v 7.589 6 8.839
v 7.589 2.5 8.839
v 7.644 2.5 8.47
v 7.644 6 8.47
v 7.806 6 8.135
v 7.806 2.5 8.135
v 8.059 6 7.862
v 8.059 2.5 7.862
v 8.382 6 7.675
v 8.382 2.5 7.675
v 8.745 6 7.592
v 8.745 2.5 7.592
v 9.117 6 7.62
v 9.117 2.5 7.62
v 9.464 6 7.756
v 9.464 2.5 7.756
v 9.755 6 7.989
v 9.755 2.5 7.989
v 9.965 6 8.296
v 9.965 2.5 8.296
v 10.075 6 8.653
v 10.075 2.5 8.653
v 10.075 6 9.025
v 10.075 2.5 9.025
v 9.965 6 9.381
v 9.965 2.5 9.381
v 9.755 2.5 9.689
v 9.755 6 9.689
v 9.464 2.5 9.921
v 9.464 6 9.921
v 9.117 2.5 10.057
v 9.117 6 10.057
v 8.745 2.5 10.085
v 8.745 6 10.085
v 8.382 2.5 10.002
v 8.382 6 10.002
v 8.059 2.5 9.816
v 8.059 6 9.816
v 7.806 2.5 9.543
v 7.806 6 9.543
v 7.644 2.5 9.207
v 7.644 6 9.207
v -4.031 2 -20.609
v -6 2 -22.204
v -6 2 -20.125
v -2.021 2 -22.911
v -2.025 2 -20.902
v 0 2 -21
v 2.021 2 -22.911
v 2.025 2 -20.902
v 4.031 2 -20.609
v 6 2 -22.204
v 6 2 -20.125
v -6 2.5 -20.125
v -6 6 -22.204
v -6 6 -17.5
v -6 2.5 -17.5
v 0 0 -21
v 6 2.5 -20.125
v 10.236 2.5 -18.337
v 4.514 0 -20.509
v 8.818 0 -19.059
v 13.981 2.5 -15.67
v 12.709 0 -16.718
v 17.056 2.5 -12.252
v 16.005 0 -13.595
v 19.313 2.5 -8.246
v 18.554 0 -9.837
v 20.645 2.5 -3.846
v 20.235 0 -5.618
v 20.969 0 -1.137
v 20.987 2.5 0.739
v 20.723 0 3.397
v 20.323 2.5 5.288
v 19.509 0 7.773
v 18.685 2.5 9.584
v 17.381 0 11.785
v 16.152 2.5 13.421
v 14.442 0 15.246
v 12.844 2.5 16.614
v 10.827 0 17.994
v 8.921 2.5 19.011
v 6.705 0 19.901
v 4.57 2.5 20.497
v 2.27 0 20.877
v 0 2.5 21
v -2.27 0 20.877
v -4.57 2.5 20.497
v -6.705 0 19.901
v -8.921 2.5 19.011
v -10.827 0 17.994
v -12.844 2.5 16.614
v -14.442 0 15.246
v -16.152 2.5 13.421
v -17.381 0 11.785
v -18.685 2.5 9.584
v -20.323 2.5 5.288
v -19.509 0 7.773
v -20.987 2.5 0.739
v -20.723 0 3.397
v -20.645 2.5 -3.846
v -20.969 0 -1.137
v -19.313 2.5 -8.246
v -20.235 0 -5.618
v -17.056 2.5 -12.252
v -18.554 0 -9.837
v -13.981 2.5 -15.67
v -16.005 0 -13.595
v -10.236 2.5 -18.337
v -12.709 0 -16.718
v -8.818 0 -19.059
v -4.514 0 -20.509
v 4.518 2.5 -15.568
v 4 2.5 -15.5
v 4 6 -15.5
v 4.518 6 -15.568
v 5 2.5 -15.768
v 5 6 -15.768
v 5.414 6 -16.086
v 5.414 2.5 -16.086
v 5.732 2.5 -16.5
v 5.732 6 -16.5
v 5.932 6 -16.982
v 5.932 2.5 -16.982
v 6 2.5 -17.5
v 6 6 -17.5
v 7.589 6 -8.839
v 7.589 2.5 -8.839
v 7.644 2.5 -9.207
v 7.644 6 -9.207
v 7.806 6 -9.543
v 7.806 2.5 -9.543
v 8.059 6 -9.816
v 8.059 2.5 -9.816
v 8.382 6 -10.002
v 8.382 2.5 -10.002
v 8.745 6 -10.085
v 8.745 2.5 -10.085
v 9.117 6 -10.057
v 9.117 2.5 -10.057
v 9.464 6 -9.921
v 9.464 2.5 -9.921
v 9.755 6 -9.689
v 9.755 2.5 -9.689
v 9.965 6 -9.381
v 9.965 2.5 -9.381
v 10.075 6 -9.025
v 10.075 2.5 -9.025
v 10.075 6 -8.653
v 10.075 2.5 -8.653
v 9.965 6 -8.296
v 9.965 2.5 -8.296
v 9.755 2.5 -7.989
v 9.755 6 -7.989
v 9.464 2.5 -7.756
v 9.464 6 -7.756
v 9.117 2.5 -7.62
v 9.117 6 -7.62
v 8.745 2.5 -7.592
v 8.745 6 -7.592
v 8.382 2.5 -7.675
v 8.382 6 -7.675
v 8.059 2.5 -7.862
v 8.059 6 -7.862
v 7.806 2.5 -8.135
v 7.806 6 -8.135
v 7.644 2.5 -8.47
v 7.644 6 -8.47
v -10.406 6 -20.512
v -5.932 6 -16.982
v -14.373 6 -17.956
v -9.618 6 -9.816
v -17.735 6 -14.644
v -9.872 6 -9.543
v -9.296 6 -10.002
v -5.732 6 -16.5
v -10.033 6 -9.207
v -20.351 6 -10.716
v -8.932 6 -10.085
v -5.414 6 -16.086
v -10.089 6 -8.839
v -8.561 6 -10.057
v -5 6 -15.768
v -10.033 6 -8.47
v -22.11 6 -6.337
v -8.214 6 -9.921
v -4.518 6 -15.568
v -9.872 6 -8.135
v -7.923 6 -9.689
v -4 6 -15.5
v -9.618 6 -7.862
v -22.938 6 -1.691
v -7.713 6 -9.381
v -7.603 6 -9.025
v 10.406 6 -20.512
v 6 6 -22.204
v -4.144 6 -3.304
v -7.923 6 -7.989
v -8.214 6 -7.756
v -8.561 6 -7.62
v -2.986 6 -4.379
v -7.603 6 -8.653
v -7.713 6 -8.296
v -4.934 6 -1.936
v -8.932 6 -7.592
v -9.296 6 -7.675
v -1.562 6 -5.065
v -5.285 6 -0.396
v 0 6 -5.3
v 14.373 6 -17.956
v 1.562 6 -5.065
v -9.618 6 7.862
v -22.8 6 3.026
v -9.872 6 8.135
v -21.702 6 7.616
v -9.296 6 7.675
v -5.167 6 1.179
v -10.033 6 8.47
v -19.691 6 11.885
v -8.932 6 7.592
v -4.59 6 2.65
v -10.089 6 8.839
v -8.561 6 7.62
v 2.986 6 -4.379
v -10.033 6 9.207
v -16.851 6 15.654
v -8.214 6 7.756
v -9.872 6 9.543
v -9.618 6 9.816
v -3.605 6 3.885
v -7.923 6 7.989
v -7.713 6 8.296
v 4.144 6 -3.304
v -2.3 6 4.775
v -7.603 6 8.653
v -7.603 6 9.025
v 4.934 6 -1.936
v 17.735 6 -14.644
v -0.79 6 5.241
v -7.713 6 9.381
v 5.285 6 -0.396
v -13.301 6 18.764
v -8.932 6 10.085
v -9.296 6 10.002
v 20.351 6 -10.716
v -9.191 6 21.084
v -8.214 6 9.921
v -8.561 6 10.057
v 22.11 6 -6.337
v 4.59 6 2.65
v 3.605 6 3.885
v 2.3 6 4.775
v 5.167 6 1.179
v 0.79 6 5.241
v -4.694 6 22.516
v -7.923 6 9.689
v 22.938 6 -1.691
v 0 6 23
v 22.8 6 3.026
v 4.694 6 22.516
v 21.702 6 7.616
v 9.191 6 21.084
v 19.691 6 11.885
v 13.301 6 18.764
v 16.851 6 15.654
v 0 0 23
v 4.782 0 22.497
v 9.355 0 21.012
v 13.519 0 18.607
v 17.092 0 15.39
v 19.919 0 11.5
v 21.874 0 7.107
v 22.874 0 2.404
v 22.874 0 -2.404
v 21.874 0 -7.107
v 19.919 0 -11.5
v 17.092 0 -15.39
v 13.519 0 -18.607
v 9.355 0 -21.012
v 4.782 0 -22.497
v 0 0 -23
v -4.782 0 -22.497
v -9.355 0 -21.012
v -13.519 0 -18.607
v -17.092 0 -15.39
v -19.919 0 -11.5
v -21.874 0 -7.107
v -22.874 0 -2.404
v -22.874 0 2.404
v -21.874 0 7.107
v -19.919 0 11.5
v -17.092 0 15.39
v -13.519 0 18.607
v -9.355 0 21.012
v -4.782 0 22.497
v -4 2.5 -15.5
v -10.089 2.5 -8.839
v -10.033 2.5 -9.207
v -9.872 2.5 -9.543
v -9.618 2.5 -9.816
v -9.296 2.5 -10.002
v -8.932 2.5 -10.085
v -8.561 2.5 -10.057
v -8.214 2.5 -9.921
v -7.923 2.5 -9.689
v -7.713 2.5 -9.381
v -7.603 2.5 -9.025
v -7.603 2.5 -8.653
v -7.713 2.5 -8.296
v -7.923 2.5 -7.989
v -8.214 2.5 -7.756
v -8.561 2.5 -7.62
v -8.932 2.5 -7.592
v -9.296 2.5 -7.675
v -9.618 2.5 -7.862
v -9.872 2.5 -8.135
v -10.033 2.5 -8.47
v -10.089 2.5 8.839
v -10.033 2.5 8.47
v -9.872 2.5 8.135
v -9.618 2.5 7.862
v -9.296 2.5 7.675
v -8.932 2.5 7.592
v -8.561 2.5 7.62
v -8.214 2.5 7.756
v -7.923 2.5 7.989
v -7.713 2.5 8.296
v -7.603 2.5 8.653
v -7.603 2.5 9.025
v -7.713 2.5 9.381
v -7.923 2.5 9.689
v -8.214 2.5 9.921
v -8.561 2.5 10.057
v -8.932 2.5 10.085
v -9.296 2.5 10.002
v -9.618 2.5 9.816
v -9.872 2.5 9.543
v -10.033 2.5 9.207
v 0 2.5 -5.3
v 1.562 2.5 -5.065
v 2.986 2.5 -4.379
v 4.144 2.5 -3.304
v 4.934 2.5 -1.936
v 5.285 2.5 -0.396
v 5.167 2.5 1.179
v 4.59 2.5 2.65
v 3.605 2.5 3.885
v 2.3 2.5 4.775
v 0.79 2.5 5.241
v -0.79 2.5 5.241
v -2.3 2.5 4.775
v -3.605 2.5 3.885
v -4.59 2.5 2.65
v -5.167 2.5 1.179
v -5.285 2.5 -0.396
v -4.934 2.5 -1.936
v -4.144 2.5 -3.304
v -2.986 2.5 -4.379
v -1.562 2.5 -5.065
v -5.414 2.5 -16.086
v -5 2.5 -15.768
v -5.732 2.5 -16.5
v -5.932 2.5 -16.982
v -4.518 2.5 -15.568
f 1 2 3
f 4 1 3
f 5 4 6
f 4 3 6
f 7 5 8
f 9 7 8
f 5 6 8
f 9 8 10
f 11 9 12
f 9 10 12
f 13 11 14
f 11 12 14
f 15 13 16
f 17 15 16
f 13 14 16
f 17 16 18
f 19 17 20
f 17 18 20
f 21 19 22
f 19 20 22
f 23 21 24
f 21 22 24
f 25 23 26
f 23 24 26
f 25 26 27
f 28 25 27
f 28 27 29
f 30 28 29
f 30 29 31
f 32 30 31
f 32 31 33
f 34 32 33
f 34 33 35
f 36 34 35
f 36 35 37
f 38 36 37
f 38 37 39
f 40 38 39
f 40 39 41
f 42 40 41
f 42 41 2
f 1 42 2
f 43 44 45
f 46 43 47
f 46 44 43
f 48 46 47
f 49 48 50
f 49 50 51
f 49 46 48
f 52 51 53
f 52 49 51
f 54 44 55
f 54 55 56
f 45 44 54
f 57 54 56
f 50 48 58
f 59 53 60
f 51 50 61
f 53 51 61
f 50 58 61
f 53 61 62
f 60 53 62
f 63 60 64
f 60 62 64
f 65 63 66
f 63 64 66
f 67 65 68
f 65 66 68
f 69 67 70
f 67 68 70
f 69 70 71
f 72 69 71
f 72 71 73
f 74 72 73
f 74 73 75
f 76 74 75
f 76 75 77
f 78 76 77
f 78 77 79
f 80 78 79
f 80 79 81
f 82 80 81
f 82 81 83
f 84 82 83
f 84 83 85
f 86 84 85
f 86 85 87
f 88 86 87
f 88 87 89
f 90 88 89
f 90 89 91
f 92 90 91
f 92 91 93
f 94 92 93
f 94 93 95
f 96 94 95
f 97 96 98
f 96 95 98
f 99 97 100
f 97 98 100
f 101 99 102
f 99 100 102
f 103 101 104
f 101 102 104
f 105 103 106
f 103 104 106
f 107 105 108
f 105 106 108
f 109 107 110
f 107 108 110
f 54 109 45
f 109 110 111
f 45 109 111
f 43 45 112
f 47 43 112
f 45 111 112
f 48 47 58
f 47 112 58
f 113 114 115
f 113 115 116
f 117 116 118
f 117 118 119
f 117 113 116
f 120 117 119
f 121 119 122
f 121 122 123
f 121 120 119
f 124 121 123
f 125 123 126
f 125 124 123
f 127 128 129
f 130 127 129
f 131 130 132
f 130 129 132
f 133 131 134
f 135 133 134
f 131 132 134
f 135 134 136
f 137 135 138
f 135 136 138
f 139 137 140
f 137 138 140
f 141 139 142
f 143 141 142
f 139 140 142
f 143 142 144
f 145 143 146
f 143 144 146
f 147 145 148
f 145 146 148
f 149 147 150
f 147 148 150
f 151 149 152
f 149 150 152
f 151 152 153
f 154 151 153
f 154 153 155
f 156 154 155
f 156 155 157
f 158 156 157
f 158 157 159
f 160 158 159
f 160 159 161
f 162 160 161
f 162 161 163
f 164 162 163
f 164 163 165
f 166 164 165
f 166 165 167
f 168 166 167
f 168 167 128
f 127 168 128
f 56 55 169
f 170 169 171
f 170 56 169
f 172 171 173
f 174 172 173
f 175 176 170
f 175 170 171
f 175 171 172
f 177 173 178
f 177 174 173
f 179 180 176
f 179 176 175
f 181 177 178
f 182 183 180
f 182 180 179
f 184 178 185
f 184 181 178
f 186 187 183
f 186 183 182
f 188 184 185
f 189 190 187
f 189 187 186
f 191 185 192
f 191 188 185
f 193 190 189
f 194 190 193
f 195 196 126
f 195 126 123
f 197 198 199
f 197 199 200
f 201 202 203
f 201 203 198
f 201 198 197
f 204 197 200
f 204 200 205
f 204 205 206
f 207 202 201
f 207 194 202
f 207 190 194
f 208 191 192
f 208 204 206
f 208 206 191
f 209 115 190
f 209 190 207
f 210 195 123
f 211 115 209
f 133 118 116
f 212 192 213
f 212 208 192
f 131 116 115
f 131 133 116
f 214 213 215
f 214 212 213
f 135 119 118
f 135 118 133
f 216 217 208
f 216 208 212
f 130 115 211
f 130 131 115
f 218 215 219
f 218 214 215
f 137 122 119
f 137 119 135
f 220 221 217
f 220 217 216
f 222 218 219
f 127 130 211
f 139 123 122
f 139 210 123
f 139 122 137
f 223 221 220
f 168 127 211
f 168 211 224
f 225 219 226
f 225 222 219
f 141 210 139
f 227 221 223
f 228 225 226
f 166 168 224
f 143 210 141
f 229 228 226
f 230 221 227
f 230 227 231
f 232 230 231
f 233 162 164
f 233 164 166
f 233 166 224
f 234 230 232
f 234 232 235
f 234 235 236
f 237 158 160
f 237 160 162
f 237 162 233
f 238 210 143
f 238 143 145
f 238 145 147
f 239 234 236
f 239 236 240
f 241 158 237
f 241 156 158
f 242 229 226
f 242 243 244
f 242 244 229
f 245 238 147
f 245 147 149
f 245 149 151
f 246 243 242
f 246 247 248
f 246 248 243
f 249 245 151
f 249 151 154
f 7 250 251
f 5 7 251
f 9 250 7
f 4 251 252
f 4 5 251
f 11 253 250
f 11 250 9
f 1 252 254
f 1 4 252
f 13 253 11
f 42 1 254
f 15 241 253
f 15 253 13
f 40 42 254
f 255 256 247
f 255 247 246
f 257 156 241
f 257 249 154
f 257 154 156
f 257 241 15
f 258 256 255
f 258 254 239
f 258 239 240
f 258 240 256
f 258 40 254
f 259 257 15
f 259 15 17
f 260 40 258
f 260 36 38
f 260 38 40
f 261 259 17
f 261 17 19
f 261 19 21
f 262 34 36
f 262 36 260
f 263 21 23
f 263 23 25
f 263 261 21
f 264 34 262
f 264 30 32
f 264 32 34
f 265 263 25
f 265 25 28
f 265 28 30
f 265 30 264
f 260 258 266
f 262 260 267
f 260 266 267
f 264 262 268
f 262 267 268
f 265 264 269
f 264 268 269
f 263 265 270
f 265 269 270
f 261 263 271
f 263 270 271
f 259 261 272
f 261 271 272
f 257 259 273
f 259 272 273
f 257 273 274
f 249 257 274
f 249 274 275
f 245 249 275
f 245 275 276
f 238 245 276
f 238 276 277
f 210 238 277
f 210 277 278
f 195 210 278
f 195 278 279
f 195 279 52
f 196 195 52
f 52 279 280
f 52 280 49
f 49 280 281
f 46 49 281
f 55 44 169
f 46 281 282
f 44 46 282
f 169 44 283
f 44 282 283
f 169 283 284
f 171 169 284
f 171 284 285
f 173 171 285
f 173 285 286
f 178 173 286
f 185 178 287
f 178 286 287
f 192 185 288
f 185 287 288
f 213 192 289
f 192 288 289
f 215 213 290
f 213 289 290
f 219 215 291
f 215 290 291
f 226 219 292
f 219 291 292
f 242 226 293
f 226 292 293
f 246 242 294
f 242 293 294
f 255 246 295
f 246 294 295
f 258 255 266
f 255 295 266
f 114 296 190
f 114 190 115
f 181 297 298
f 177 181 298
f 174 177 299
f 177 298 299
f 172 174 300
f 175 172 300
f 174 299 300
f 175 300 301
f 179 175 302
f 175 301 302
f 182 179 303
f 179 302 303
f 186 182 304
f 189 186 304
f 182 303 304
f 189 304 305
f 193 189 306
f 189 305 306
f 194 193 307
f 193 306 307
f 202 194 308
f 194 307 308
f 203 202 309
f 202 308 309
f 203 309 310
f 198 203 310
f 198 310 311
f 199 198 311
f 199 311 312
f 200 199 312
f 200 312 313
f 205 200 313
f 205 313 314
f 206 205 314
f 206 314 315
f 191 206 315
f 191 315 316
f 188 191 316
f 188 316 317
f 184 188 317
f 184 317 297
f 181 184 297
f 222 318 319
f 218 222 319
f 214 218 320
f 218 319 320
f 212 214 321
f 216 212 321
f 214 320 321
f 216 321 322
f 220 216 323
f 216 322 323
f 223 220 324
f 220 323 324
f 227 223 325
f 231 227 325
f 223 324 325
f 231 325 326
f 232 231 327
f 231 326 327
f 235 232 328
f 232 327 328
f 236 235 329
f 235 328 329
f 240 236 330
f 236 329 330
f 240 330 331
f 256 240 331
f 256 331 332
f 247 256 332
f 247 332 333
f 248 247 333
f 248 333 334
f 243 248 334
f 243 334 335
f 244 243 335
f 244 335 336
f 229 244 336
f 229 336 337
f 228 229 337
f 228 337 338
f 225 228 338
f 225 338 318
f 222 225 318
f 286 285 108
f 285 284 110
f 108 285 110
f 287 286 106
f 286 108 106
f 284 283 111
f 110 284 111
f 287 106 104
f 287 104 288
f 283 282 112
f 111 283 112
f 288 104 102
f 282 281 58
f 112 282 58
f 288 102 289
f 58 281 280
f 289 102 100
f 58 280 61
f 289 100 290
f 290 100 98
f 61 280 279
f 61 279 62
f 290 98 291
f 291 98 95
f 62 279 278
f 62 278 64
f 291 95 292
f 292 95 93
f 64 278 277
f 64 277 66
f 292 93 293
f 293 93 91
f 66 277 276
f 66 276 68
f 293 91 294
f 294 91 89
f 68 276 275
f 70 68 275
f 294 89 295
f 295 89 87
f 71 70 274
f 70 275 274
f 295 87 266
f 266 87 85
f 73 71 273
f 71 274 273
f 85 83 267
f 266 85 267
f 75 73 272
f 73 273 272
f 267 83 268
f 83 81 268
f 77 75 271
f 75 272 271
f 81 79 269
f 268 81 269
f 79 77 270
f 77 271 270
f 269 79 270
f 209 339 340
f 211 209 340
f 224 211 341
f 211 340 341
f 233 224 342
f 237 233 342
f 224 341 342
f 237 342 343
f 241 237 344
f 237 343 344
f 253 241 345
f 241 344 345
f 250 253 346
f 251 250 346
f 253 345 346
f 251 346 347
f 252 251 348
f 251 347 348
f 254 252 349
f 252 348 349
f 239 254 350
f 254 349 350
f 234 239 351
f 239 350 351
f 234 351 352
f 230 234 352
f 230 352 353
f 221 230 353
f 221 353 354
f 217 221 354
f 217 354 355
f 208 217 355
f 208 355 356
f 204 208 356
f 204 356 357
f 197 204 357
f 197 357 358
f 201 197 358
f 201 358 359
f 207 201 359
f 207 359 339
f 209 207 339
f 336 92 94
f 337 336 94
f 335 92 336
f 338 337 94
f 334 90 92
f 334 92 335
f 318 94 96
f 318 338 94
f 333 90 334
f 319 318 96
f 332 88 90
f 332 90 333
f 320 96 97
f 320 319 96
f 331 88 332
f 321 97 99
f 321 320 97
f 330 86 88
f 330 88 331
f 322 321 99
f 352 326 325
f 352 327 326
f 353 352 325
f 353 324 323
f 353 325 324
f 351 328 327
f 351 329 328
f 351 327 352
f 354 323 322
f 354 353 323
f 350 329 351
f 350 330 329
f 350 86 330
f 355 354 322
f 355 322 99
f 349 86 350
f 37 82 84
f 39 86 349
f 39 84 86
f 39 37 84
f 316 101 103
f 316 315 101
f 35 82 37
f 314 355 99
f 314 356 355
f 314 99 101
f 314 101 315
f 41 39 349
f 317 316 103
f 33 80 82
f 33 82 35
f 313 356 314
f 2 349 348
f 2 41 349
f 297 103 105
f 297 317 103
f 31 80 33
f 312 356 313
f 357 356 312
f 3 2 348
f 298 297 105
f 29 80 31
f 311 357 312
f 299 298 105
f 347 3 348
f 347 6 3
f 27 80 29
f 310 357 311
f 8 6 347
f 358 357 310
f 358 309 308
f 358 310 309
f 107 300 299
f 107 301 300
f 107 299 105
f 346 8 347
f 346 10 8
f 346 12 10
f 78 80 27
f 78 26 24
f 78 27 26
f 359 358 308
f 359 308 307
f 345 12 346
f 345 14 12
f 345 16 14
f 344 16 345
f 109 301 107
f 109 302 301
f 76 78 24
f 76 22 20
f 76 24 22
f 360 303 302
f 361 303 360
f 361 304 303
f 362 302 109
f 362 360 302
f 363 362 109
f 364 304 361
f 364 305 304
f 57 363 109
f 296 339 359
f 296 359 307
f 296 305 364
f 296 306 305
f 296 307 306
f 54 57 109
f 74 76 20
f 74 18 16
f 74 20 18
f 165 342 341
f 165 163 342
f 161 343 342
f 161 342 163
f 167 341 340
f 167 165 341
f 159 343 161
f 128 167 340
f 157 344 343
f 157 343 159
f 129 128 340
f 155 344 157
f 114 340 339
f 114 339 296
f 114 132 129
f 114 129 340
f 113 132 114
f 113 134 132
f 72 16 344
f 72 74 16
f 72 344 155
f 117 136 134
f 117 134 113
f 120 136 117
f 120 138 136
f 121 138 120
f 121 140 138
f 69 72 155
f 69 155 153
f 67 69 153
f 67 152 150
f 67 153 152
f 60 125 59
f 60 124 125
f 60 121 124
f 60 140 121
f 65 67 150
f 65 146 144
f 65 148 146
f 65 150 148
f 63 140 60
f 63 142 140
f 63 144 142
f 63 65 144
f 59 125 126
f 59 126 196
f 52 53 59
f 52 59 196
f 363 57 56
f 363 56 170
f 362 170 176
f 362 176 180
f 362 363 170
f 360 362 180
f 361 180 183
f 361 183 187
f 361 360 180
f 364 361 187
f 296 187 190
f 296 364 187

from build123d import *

# Parameters (mm, degrees)
SKETCH_1_R          = 23
EXTRUDE_1_DEPTH     = 6
SKETCH_2_R          = 21
CUT_EXTRUDE_1_DEPTH = 2.5
SKETCH_2_3_R        = 5.3
CUT_EXTRUDE_2_DEPTH = 34.075670817
CUT_EXTRUDE_START   = -4
CUT_EXTRUDE_3_DEPTH = 4
M3X0_51_D           = 2.5


with BuildPart() as part:
    # Эскиз1 → Бобышка-Вытянуть1 (new body)
    with BuildSketch(Plane(origin=(0, 0, 0), x_dir=(1, 0, 0), z_dir=(0, 1, 0))):
        Circle(SKETCH_1_R)
    extrude(amount=EXTRUDE_1_DEPTH)

    # Эскиз2 → Вырез-Вытянуть1 (cut)
    with BuildSketch(Plane.XZ):
        Circle(SKETCH_2_R)
    extrude(amount=-CUT_EXTRUDE_1_DEPTH, mode=Mode.SUBTRACT)

    # Эскиз2<3> → Вырез-Вытянуть2 (cut, through all)
    with BuildSketch(Plane.XZ):
        Circle(SKETCH_2_3_R)
    extrude(amount=-CUT_EXTRUDE_2_DEPTH, mode=Mode.SUBTRACT)

    # Эскиз4 → Вырез-Вытянуть3 (cut)
    with BuildSketch(Plane(origin=(0, 6, 0), x_dir=(1, 0, 0), z_dir=(0, 1, 0)).offset(CUT_EXTRUDE_START)):
        with BuildLine():
            Line((-6, 22.203603311), (-6, 17.5))
            ThreePointArc((-6, 17.5), (-5.414213562, 16.085786438), (-4, 15.5))
            Line((-4, 15.5), (4, 15.5))
            ThreePointArc((4, 15.5), (5.414213562, 16.085786438), (6, 17.5))
            Line((6, 17.5), (6, 22.203603311))
            ThreePointArc((6, 22.203603311), (0, 23), (-6, 22.203603311))
        make_face()
    extrude(amount=CUT_EXTRUDE_3_DEPTH, mode=Mode.SUBTRACT)

    # Отверстие обработанное метчиком M3x0.51 (through all)
    with Locations(Plane(origin=(0, 6, 0), x_dir=(1, 0, 0), z_dir=(0, 1, 0))):
        with Locations((-8.838834765, 8.838834765), (8.838834765, 8.838834765), (8.838834765, -8.838834765), (-8.838834765, -8.838834765)):
            Hole(M3X0_51_D / 2)


solid = part.part
